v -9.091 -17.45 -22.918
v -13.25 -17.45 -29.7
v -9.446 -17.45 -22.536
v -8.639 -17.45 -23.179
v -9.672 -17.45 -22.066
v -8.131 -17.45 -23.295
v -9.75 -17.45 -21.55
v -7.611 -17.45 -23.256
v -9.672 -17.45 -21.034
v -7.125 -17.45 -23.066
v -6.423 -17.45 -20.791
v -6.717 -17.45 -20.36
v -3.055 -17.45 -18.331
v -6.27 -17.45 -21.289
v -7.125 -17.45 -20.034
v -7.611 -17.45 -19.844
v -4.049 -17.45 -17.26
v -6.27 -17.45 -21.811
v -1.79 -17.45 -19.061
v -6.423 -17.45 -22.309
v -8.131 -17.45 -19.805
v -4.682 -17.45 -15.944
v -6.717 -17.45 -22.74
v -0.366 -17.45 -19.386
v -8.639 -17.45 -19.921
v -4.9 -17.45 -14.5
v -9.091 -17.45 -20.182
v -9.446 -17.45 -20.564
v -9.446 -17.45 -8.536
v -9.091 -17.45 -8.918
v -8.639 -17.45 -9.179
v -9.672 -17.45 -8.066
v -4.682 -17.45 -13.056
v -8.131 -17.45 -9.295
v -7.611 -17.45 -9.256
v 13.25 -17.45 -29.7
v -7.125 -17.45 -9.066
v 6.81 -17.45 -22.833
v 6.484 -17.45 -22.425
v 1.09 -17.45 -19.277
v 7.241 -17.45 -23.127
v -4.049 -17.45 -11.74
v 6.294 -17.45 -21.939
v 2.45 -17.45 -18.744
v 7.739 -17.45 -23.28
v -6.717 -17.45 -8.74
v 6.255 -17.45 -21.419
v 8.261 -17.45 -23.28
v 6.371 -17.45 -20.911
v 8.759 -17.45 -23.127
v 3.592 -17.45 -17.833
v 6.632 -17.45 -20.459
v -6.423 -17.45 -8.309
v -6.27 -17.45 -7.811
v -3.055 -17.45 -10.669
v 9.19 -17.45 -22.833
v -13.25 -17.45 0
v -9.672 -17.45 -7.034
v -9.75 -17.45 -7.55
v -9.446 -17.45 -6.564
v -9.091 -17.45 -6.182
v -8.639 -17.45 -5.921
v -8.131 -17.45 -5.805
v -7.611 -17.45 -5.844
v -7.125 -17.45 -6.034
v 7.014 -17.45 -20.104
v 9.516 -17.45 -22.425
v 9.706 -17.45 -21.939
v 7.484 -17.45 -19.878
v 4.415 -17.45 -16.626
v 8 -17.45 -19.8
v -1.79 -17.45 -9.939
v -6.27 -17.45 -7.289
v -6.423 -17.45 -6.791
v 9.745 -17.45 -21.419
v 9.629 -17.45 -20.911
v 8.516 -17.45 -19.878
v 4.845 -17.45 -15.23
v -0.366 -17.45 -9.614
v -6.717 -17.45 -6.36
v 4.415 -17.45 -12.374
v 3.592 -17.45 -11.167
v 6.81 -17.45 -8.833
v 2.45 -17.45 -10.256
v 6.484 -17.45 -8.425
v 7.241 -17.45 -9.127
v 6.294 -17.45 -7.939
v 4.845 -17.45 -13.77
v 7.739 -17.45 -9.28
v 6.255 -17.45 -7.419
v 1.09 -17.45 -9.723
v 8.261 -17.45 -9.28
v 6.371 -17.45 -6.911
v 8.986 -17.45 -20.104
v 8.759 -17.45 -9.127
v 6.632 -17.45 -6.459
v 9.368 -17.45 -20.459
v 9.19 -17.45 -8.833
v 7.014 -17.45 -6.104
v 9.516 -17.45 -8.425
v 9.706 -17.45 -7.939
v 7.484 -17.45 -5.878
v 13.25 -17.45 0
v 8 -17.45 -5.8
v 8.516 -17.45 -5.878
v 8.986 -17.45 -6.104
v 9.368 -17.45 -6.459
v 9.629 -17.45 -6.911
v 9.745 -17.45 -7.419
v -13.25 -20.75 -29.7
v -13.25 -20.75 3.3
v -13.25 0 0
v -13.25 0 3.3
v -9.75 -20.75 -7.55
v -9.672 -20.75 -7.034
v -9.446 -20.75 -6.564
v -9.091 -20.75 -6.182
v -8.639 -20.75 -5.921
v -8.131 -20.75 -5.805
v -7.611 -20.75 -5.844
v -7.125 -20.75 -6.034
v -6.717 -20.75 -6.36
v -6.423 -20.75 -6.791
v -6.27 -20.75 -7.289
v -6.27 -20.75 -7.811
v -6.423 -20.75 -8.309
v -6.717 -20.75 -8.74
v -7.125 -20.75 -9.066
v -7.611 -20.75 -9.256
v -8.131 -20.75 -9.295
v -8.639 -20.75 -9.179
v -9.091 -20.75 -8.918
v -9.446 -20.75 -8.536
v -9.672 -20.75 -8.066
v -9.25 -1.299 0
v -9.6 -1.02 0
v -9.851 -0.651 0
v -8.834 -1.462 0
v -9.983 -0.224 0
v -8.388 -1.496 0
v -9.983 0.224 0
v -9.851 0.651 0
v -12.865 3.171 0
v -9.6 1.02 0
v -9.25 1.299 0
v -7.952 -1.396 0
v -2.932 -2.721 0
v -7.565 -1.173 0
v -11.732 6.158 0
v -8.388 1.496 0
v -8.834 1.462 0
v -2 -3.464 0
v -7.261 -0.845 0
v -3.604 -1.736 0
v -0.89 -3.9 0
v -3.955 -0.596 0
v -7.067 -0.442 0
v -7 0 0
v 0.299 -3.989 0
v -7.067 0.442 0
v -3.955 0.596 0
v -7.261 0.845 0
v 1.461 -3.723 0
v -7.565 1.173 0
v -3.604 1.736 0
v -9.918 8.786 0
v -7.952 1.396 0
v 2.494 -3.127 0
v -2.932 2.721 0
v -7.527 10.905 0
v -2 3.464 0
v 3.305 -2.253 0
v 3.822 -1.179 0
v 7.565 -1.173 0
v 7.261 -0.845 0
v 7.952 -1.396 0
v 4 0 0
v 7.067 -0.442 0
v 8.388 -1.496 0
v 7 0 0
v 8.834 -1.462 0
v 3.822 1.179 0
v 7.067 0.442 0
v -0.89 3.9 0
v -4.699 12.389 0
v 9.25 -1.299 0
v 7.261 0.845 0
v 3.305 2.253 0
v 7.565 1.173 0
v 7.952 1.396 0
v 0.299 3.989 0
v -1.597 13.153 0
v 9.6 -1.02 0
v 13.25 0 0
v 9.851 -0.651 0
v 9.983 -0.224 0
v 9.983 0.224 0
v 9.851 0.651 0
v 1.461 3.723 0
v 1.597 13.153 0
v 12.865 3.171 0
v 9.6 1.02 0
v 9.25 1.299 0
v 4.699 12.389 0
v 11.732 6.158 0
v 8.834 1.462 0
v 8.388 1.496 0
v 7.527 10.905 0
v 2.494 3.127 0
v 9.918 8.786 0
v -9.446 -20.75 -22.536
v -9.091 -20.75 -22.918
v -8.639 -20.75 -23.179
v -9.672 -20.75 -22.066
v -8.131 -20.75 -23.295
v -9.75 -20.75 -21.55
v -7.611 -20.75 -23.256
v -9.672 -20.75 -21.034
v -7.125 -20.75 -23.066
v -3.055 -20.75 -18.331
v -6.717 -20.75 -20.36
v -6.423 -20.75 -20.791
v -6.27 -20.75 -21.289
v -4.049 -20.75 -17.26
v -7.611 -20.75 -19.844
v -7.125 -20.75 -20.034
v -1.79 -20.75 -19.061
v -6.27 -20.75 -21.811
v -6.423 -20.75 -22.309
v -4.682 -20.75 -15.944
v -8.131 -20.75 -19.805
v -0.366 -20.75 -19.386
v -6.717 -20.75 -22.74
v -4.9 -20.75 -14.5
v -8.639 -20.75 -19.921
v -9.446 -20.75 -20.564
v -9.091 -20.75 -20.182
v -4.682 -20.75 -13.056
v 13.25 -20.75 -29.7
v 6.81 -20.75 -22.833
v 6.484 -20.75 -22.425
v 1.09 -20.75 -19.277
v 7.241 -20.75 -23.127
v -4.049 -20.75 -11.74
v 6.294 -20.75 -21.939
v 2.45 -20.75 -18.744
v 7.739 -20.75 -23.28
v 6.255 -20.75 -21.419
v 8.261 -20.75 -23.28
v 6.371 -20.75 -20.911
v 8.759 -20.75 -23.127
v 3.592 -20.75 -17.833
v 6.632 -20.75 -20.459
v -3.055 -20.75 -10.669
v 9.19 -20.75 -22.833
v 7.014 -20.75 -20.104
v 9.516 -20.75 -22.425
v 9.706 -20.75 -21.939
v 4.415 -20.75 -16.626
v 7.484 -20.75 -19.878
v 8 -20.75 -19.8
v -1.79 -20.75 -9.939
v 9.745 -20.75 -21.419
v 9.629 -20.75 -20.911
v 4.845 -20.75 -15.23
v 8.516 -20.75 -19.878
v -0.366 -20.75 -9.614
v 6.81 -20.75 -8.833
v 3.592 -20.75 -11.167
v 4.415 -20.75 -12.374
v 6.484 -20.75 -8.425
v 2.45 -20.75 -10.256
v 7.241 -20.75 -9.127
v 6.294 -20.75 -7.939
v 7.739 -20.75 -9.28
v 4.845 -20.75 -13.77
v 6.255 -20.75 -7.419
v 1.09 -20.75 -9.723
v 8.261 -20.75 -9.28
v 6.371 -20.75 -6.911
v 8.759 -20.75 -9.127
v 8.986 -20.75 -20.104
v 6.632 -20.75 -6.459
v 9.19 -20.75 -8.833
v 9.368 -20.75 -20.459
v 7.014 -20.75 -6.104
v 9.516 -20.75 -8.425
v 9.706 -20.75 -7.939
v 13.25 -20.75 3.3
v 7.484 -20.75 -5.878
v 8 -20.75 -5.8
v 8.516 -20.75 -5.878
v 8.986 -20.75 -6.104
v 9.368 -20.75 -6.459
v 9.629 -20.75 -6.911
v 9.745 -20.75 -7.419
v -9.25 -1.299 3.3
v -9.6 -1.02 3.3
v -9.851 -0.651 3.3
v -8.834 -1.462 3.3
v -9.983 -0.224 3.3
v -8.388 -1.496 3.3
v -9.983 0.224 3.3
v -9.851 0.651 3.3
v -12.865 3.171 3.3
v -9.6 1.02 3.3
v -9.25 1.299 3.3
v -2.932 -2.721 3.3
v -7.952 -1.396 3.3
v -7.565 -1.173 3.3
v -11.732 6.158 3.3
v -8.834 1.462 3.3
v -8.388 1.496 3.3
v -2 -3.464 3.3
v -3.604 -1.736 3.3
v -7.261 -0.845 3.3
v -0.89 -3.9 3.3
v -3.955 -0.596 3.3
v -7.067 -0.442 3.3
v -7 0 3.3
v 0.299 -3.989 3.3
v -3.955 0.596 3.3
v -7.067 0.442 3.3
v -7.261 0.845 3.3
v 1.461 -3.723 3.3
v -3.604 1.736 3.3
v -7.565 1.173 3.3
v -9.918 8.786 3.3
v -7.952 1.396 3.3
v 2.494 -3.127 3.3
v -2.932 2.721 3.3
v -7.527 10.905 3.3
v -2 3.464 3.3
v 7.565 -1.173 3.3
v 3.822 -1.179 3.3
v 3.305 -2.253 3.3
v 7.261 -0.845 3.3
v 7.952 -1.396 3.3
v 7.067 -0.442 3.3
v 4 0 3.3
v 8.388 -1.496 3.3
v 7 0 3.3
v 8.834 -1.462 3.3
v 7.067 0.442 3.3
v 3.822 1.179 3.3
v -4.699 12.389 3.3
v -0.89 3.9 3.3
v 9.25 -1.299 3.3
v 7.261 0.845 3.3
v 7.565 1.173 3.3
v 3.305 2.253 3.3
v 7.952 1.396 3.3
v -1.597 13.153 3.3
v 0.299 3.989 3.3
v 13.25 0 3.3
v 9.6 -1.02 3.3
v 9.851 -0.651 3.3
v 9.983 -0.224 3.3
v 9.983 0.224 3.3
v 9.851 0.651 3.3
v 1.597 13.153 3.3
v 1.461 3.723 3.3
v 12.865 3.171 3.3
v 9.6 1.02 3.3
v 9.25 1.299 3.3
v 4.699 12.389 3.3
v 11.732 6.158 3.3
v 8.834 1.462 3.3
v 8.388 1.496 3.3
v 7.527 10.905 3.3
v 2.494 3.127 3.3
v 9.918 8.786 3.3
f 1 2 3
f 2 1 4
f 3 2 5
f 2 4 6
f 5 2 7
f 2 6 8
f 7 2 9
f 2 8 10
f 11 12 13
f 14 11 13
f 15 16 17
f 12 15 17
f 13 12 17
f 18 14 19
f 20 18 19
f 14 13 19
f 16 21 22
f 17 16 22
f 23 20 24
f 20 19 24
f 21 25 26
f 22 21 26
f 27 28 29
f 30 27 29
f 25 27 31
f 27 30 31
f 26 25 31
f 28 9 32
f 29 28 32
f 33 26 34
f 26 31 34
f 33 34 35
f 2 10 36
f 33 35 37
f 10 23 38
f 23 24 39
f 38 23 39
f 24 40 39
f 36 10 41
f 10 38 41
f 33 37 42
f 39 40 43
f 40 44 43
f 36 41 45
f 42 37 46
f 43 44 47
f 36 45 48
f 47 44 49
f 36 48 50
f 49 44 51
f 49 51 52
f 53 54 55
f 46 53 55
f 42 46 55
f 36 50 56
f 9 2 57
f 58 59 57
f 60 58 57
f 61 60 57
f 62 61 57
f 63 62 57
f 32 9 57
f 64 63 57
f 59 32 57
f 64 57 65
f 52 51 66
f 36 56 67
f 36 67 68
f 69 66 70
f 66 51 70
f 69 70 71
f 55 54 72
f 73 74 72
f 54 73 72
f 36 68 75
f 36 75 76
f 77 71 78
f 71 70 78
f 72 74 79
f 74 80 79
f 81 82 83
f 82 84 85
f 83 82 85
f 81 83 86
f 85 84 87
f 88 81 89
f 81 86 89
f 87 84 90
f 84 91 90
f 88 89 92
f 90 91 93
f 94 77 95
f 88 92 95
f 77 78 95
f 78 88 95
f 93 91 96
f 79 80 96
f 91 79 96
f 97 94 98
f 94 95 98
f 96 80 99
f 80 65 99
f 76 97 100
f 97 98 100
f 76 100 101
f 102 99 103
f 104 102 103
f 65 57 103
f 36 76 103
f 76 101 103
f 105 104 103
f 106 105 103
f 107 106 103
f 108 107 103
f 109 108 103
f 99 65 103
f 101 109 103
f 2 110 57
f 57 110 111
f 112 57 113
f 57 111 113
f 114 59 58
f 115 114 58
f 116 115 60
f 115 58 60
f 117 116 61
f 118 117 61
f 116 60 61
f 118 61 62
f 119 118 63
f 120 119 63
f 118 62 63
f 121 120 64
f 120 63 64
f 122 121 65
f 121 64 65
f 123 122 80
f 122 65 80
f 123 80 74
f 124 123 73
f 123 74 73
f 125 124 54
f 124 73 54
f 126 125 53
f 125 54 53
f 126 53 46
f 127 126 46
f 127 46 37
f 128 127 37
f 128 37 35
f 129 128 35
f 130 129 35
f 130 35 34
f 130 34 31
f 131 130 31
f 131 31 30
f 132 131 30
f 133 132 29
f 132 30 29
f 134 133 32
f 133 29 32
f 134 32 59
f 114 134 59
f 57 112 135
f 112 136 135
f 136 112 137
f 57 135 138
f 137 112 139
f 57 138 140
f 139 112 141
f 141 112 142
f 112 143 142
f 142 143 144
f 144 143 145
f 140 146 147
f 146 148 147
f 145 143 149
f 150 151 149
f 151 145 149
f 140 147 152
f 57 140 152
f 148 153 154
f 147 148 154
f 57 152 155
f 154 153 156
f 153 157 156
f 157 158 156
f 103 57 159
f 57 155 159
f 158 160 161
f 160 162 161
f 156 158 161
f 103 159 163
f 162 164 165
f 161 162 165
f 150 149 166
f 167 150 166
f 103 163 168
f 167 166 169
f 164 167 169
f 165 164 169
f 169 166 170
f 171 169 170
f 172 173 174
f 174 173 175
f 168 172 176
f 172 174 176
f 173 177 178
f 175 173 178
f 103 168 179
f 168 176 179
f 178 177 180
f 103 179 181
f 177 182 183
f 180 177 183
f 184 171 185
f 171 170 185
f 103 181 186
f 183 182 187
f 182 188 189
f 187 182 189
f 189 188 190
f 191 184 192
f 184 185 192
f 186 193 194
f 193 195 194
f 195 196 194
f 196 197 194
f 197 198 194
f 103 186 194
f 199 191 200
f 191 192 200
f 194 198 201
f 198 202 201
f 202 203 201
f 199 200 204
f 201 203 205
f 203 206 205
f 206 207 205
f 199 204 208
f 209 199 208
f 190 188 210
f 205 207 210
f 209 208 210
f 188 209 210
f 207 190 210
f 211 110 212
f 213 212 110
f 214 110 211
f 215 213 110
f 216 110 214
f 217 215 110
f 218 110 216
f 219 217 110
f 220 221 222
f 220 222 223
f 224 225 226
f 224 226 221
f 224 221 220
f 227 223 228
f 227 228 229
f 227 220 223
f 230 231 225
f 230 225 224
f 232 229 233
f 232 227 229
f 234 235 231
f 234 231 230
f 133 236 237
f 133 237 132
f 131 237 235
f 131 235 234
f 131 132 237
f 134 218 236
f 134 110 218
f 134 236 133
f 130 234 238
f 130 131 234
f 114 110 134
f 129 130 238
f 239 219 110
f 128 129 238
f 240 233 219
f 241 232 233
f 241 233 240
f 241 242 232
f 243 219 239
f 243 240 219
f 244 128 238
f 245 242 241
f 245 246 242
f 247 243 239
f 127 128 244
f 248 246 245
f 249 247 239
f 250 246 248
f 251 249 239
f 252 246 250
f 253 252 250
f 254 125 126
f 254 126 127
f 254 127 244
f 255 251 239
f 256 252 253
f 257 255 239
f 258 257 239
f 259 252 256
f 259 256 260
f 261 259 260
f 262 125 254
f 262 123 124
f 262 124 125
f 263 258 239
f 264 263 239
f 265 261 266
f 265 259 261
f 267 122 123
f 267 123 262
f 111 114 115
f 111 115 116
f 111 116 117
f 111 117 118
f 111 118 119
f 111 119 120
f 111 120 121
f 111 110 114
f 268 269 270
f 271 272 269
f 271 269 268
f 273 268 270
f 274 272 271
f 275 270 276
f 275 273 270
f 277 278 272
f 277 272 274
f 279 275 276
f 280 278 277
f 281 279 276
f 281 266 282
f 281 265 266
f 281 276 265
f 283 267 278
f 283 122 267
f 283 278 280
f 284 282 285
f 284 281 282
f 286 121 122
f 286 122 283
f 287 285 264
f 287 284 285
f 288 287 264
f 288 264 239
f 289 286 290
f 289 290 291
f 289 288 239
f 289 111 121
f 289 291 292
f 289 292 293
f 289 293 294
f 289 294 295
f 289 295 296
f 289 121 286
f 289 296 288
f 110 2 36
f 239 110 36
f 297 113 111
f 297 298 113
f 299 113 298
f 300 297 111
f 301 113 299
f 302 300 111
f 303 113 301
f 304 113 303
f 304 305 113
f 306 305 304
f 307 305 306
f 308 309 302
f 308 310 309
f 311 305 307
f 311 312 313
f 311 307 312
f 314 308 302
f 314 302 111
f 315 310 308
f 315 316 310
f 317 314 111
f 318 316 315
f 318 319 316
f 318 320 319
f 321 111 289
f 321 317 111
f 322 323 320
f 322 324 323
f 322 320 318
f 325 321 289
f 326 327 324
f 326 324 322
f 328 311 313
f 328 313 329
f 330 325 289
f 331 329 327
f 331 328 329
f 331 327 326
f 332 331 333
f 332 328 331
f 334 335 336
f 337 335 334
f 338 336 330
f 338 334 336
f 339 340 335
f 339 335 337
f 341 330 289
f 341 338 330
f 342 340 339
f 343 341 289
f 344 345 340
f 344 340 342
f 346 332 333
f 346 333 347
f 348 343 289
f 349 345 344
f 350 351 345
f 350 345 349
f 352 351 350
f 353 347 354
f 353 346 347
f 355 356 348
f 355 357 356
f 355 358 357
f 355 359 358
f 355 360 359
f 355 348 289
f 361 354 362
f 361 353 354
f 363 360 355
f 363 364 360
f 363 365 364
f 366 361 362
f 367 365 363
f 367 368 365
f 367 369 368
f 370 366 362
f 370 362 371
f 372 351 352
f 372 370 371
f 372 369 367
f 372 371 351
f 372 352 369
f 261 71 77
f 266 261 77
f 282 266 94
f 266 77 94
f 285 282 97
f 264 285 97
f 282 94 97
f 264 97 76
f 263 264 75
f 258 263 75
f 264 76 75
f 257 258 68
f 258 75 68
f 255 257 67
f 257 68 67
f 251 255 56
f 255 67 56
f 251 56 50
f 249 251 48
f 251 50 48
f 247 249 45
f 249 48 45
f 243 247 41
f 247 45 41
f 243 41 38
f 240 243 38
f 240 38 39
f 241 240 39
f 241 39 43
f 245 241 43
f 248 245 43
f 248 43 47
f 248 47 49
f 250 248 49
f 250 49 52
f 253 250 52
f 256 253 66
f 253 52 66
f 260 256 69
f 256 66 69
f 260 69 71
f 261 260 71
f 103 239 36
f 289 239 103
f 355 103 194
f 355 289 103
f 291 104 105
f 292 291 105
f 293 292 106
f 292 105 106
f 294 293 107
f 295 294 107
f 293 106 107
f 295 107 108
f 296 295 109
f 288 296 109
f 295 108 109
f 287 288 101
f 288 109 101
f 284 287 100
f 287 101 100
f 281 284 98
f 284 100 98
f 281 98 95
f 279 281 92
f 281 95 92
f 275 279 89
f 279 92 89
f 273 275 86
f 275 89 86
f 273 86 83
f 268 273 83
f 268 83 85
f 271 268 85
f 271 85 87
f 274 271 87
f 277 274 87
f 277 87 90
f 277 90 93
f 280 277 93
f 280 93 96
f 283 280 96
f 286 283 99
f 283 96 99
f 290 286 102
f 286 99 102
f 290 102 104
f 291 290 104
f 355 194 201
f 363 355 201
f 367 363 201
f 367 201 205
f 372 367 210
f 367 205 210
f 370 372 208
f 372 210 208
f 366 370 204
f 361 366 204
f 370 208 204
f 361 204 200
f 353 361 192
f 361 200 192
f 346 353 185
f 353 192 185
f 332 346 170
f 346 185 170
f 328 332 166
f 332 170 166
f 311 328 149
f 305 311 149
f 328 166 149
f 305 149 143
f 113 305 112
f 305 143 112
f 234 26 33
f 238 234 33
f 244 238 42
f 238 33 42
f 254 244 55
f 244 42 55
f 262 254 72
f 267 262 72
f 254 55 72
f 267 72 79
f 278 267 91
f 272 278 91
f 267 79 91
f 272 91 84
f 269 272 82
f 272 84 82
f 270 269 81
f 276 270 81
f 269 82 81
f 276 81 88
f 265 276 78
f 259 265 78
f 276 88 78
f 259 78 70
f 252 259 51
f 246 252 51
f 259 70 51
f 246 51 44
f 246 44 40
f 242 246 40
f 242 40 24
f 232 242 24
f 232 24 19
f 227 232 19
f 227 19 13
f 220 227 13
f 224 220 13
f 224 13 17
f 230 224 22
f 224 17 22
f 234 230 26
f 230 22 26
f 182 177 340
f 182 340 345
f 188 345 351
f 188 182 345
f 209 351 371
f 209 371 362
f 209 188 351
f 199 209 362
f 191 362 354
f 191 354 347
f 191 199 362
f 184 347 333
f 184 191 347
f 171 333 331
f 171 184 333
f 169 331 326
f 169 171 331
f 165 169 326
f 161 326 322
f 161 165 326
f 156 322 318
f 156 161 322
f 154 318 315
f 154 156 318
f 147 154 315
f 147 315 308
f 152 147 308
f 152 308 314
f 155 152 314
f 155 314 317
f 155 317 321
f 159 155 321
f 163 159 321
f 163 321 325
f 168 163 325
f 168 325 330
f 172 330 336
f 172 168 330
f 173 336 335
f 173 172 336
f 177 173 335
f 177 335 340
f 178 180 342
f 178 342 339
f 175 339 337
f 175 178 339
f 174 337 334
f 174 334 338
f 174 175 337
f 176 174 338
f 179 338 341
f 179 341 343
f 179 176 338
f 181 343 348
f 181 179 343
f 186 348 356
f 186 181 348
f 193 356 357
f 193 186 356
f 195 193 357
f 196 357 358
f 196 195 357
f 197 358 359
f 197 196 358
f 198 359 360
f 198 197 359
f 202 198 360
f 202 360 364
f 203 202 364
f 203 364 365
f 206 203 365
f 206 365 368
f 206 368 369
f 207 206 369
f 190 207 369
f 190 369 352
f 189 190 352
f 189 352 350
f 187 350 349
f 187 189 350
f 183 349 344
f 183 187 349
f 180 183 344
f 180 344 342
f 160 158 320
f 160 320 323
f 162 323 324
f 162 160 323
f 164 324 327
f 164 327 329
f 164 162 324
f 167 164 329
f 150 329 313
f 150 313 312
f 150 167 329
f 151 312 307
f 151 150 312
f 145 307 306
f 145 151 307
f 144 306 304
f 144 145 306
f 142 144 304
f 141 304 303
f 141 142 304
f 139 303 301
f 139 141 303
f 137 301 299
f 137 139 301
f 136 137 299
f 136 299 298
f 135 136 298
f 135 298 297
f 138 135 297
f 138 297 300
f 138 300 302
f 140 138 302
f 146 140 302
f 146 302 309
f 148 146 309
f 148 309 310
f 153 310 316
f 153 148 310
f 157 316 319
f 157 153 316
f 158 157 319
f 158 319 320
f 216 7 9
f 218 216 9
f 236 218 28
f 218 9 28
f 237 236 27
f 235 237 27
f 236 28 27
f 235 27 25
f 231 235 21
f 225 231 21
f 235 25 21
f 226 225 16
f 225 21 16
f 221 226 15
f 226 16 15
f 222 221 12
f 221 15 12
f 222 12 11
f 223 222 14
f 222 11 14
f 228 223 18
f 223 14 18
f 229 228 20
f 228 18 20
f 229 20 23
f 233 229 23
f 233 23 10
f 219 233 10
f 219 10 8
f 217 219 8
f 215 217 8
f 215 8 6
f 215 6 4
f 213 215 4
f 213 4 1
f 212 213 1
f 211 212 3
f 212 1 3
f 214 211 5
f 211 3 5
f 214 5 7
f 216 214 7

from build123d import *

# Parameters (mm, degrees)
SKETCH_1_R          = 4
SKETCH_1_R_2        = 1.5
EXTRUDE_1_DEPTH     = 3.3
SKETCH_2_W          = 26.5
SKETCH_2_H          = 3.3
EXTRUDE_2_DEPTH     = 29.7
SKETCH_3_R          = 4.9
SKETCH_3_R_2        = 1.75
CUT_EXTRUDE_1_DEPTH = 3.3


with BuildPart() as part:
    # 草图1 → 凸台-拉伸1 (new body)
    with BuildSketch(Plane.XY):
        with BuildLine():
            Line((-13.25, 0), (-13.25, -20.75))
            Line((-13.25, -20.75), (13.25, -20.75))
            Line((13.25, -20.75), (13.25, 0))
            ThreePointArc((13.25, 0), (0, 13.25), (-13.25, 0))
        make_face()
        Circle(SKETCH_1_R, mode=Mode.SUBTRACT)
        with Locations((-8.5, 0)):
            Circle(SKETCH_1_R_2, mode=Mode.SUBTRACT)
        with Locations(Location((8.5, 0, 0), (0, 0, 180))):
            Circle(SKETCH_1_R_2, mode=Mode.SUBTRACT)
    extrude(amount=EXTRUDE_1_DEPTH)

    # 草图2 → 凸台-拉伸2 (add)
    with BuildSketch(Plane.XY):
        with Locations((0, -19.1)):
            Rectangle(SKETCH_2_W, SKETCH_2_H)
    extrude(amount=-EXTRUDE_2_DEPTH)

    # 草图3 → 切除-拉伸1 (cut)
    with BuildSketch(Plane(origin=(0, -17.45, 0), x_dir=(1, 0, 0), z_dir=(0, 1, 0))):
        with Locations(Location((0, 14.5, 0), (0, 0, 180))):
            Circle(SKETCH_3_R)
        with Locations(Location((-8, 21.55, 0), (0, 0, 180))):
            Circle(SKETCH_3_R_2)
        with Locations(Location((-8, 7.55, 0), (0, 0, 180))):
            Circle(SKETCH_3_R_2)
        with Locations(Location((8, 7.55, 0), (0, 0, 270))):
            Circle(SKETCH_3_R_2)
        with Locations(Location((8, 21.55, 0), (0, 0, 270))):
            Circle(SKETCH_3_R_2)
    extrude(amount=-CUT_EXTRUDE_1_DEPTH, mode=Mode.SUBTRACT)


solid = part.part
